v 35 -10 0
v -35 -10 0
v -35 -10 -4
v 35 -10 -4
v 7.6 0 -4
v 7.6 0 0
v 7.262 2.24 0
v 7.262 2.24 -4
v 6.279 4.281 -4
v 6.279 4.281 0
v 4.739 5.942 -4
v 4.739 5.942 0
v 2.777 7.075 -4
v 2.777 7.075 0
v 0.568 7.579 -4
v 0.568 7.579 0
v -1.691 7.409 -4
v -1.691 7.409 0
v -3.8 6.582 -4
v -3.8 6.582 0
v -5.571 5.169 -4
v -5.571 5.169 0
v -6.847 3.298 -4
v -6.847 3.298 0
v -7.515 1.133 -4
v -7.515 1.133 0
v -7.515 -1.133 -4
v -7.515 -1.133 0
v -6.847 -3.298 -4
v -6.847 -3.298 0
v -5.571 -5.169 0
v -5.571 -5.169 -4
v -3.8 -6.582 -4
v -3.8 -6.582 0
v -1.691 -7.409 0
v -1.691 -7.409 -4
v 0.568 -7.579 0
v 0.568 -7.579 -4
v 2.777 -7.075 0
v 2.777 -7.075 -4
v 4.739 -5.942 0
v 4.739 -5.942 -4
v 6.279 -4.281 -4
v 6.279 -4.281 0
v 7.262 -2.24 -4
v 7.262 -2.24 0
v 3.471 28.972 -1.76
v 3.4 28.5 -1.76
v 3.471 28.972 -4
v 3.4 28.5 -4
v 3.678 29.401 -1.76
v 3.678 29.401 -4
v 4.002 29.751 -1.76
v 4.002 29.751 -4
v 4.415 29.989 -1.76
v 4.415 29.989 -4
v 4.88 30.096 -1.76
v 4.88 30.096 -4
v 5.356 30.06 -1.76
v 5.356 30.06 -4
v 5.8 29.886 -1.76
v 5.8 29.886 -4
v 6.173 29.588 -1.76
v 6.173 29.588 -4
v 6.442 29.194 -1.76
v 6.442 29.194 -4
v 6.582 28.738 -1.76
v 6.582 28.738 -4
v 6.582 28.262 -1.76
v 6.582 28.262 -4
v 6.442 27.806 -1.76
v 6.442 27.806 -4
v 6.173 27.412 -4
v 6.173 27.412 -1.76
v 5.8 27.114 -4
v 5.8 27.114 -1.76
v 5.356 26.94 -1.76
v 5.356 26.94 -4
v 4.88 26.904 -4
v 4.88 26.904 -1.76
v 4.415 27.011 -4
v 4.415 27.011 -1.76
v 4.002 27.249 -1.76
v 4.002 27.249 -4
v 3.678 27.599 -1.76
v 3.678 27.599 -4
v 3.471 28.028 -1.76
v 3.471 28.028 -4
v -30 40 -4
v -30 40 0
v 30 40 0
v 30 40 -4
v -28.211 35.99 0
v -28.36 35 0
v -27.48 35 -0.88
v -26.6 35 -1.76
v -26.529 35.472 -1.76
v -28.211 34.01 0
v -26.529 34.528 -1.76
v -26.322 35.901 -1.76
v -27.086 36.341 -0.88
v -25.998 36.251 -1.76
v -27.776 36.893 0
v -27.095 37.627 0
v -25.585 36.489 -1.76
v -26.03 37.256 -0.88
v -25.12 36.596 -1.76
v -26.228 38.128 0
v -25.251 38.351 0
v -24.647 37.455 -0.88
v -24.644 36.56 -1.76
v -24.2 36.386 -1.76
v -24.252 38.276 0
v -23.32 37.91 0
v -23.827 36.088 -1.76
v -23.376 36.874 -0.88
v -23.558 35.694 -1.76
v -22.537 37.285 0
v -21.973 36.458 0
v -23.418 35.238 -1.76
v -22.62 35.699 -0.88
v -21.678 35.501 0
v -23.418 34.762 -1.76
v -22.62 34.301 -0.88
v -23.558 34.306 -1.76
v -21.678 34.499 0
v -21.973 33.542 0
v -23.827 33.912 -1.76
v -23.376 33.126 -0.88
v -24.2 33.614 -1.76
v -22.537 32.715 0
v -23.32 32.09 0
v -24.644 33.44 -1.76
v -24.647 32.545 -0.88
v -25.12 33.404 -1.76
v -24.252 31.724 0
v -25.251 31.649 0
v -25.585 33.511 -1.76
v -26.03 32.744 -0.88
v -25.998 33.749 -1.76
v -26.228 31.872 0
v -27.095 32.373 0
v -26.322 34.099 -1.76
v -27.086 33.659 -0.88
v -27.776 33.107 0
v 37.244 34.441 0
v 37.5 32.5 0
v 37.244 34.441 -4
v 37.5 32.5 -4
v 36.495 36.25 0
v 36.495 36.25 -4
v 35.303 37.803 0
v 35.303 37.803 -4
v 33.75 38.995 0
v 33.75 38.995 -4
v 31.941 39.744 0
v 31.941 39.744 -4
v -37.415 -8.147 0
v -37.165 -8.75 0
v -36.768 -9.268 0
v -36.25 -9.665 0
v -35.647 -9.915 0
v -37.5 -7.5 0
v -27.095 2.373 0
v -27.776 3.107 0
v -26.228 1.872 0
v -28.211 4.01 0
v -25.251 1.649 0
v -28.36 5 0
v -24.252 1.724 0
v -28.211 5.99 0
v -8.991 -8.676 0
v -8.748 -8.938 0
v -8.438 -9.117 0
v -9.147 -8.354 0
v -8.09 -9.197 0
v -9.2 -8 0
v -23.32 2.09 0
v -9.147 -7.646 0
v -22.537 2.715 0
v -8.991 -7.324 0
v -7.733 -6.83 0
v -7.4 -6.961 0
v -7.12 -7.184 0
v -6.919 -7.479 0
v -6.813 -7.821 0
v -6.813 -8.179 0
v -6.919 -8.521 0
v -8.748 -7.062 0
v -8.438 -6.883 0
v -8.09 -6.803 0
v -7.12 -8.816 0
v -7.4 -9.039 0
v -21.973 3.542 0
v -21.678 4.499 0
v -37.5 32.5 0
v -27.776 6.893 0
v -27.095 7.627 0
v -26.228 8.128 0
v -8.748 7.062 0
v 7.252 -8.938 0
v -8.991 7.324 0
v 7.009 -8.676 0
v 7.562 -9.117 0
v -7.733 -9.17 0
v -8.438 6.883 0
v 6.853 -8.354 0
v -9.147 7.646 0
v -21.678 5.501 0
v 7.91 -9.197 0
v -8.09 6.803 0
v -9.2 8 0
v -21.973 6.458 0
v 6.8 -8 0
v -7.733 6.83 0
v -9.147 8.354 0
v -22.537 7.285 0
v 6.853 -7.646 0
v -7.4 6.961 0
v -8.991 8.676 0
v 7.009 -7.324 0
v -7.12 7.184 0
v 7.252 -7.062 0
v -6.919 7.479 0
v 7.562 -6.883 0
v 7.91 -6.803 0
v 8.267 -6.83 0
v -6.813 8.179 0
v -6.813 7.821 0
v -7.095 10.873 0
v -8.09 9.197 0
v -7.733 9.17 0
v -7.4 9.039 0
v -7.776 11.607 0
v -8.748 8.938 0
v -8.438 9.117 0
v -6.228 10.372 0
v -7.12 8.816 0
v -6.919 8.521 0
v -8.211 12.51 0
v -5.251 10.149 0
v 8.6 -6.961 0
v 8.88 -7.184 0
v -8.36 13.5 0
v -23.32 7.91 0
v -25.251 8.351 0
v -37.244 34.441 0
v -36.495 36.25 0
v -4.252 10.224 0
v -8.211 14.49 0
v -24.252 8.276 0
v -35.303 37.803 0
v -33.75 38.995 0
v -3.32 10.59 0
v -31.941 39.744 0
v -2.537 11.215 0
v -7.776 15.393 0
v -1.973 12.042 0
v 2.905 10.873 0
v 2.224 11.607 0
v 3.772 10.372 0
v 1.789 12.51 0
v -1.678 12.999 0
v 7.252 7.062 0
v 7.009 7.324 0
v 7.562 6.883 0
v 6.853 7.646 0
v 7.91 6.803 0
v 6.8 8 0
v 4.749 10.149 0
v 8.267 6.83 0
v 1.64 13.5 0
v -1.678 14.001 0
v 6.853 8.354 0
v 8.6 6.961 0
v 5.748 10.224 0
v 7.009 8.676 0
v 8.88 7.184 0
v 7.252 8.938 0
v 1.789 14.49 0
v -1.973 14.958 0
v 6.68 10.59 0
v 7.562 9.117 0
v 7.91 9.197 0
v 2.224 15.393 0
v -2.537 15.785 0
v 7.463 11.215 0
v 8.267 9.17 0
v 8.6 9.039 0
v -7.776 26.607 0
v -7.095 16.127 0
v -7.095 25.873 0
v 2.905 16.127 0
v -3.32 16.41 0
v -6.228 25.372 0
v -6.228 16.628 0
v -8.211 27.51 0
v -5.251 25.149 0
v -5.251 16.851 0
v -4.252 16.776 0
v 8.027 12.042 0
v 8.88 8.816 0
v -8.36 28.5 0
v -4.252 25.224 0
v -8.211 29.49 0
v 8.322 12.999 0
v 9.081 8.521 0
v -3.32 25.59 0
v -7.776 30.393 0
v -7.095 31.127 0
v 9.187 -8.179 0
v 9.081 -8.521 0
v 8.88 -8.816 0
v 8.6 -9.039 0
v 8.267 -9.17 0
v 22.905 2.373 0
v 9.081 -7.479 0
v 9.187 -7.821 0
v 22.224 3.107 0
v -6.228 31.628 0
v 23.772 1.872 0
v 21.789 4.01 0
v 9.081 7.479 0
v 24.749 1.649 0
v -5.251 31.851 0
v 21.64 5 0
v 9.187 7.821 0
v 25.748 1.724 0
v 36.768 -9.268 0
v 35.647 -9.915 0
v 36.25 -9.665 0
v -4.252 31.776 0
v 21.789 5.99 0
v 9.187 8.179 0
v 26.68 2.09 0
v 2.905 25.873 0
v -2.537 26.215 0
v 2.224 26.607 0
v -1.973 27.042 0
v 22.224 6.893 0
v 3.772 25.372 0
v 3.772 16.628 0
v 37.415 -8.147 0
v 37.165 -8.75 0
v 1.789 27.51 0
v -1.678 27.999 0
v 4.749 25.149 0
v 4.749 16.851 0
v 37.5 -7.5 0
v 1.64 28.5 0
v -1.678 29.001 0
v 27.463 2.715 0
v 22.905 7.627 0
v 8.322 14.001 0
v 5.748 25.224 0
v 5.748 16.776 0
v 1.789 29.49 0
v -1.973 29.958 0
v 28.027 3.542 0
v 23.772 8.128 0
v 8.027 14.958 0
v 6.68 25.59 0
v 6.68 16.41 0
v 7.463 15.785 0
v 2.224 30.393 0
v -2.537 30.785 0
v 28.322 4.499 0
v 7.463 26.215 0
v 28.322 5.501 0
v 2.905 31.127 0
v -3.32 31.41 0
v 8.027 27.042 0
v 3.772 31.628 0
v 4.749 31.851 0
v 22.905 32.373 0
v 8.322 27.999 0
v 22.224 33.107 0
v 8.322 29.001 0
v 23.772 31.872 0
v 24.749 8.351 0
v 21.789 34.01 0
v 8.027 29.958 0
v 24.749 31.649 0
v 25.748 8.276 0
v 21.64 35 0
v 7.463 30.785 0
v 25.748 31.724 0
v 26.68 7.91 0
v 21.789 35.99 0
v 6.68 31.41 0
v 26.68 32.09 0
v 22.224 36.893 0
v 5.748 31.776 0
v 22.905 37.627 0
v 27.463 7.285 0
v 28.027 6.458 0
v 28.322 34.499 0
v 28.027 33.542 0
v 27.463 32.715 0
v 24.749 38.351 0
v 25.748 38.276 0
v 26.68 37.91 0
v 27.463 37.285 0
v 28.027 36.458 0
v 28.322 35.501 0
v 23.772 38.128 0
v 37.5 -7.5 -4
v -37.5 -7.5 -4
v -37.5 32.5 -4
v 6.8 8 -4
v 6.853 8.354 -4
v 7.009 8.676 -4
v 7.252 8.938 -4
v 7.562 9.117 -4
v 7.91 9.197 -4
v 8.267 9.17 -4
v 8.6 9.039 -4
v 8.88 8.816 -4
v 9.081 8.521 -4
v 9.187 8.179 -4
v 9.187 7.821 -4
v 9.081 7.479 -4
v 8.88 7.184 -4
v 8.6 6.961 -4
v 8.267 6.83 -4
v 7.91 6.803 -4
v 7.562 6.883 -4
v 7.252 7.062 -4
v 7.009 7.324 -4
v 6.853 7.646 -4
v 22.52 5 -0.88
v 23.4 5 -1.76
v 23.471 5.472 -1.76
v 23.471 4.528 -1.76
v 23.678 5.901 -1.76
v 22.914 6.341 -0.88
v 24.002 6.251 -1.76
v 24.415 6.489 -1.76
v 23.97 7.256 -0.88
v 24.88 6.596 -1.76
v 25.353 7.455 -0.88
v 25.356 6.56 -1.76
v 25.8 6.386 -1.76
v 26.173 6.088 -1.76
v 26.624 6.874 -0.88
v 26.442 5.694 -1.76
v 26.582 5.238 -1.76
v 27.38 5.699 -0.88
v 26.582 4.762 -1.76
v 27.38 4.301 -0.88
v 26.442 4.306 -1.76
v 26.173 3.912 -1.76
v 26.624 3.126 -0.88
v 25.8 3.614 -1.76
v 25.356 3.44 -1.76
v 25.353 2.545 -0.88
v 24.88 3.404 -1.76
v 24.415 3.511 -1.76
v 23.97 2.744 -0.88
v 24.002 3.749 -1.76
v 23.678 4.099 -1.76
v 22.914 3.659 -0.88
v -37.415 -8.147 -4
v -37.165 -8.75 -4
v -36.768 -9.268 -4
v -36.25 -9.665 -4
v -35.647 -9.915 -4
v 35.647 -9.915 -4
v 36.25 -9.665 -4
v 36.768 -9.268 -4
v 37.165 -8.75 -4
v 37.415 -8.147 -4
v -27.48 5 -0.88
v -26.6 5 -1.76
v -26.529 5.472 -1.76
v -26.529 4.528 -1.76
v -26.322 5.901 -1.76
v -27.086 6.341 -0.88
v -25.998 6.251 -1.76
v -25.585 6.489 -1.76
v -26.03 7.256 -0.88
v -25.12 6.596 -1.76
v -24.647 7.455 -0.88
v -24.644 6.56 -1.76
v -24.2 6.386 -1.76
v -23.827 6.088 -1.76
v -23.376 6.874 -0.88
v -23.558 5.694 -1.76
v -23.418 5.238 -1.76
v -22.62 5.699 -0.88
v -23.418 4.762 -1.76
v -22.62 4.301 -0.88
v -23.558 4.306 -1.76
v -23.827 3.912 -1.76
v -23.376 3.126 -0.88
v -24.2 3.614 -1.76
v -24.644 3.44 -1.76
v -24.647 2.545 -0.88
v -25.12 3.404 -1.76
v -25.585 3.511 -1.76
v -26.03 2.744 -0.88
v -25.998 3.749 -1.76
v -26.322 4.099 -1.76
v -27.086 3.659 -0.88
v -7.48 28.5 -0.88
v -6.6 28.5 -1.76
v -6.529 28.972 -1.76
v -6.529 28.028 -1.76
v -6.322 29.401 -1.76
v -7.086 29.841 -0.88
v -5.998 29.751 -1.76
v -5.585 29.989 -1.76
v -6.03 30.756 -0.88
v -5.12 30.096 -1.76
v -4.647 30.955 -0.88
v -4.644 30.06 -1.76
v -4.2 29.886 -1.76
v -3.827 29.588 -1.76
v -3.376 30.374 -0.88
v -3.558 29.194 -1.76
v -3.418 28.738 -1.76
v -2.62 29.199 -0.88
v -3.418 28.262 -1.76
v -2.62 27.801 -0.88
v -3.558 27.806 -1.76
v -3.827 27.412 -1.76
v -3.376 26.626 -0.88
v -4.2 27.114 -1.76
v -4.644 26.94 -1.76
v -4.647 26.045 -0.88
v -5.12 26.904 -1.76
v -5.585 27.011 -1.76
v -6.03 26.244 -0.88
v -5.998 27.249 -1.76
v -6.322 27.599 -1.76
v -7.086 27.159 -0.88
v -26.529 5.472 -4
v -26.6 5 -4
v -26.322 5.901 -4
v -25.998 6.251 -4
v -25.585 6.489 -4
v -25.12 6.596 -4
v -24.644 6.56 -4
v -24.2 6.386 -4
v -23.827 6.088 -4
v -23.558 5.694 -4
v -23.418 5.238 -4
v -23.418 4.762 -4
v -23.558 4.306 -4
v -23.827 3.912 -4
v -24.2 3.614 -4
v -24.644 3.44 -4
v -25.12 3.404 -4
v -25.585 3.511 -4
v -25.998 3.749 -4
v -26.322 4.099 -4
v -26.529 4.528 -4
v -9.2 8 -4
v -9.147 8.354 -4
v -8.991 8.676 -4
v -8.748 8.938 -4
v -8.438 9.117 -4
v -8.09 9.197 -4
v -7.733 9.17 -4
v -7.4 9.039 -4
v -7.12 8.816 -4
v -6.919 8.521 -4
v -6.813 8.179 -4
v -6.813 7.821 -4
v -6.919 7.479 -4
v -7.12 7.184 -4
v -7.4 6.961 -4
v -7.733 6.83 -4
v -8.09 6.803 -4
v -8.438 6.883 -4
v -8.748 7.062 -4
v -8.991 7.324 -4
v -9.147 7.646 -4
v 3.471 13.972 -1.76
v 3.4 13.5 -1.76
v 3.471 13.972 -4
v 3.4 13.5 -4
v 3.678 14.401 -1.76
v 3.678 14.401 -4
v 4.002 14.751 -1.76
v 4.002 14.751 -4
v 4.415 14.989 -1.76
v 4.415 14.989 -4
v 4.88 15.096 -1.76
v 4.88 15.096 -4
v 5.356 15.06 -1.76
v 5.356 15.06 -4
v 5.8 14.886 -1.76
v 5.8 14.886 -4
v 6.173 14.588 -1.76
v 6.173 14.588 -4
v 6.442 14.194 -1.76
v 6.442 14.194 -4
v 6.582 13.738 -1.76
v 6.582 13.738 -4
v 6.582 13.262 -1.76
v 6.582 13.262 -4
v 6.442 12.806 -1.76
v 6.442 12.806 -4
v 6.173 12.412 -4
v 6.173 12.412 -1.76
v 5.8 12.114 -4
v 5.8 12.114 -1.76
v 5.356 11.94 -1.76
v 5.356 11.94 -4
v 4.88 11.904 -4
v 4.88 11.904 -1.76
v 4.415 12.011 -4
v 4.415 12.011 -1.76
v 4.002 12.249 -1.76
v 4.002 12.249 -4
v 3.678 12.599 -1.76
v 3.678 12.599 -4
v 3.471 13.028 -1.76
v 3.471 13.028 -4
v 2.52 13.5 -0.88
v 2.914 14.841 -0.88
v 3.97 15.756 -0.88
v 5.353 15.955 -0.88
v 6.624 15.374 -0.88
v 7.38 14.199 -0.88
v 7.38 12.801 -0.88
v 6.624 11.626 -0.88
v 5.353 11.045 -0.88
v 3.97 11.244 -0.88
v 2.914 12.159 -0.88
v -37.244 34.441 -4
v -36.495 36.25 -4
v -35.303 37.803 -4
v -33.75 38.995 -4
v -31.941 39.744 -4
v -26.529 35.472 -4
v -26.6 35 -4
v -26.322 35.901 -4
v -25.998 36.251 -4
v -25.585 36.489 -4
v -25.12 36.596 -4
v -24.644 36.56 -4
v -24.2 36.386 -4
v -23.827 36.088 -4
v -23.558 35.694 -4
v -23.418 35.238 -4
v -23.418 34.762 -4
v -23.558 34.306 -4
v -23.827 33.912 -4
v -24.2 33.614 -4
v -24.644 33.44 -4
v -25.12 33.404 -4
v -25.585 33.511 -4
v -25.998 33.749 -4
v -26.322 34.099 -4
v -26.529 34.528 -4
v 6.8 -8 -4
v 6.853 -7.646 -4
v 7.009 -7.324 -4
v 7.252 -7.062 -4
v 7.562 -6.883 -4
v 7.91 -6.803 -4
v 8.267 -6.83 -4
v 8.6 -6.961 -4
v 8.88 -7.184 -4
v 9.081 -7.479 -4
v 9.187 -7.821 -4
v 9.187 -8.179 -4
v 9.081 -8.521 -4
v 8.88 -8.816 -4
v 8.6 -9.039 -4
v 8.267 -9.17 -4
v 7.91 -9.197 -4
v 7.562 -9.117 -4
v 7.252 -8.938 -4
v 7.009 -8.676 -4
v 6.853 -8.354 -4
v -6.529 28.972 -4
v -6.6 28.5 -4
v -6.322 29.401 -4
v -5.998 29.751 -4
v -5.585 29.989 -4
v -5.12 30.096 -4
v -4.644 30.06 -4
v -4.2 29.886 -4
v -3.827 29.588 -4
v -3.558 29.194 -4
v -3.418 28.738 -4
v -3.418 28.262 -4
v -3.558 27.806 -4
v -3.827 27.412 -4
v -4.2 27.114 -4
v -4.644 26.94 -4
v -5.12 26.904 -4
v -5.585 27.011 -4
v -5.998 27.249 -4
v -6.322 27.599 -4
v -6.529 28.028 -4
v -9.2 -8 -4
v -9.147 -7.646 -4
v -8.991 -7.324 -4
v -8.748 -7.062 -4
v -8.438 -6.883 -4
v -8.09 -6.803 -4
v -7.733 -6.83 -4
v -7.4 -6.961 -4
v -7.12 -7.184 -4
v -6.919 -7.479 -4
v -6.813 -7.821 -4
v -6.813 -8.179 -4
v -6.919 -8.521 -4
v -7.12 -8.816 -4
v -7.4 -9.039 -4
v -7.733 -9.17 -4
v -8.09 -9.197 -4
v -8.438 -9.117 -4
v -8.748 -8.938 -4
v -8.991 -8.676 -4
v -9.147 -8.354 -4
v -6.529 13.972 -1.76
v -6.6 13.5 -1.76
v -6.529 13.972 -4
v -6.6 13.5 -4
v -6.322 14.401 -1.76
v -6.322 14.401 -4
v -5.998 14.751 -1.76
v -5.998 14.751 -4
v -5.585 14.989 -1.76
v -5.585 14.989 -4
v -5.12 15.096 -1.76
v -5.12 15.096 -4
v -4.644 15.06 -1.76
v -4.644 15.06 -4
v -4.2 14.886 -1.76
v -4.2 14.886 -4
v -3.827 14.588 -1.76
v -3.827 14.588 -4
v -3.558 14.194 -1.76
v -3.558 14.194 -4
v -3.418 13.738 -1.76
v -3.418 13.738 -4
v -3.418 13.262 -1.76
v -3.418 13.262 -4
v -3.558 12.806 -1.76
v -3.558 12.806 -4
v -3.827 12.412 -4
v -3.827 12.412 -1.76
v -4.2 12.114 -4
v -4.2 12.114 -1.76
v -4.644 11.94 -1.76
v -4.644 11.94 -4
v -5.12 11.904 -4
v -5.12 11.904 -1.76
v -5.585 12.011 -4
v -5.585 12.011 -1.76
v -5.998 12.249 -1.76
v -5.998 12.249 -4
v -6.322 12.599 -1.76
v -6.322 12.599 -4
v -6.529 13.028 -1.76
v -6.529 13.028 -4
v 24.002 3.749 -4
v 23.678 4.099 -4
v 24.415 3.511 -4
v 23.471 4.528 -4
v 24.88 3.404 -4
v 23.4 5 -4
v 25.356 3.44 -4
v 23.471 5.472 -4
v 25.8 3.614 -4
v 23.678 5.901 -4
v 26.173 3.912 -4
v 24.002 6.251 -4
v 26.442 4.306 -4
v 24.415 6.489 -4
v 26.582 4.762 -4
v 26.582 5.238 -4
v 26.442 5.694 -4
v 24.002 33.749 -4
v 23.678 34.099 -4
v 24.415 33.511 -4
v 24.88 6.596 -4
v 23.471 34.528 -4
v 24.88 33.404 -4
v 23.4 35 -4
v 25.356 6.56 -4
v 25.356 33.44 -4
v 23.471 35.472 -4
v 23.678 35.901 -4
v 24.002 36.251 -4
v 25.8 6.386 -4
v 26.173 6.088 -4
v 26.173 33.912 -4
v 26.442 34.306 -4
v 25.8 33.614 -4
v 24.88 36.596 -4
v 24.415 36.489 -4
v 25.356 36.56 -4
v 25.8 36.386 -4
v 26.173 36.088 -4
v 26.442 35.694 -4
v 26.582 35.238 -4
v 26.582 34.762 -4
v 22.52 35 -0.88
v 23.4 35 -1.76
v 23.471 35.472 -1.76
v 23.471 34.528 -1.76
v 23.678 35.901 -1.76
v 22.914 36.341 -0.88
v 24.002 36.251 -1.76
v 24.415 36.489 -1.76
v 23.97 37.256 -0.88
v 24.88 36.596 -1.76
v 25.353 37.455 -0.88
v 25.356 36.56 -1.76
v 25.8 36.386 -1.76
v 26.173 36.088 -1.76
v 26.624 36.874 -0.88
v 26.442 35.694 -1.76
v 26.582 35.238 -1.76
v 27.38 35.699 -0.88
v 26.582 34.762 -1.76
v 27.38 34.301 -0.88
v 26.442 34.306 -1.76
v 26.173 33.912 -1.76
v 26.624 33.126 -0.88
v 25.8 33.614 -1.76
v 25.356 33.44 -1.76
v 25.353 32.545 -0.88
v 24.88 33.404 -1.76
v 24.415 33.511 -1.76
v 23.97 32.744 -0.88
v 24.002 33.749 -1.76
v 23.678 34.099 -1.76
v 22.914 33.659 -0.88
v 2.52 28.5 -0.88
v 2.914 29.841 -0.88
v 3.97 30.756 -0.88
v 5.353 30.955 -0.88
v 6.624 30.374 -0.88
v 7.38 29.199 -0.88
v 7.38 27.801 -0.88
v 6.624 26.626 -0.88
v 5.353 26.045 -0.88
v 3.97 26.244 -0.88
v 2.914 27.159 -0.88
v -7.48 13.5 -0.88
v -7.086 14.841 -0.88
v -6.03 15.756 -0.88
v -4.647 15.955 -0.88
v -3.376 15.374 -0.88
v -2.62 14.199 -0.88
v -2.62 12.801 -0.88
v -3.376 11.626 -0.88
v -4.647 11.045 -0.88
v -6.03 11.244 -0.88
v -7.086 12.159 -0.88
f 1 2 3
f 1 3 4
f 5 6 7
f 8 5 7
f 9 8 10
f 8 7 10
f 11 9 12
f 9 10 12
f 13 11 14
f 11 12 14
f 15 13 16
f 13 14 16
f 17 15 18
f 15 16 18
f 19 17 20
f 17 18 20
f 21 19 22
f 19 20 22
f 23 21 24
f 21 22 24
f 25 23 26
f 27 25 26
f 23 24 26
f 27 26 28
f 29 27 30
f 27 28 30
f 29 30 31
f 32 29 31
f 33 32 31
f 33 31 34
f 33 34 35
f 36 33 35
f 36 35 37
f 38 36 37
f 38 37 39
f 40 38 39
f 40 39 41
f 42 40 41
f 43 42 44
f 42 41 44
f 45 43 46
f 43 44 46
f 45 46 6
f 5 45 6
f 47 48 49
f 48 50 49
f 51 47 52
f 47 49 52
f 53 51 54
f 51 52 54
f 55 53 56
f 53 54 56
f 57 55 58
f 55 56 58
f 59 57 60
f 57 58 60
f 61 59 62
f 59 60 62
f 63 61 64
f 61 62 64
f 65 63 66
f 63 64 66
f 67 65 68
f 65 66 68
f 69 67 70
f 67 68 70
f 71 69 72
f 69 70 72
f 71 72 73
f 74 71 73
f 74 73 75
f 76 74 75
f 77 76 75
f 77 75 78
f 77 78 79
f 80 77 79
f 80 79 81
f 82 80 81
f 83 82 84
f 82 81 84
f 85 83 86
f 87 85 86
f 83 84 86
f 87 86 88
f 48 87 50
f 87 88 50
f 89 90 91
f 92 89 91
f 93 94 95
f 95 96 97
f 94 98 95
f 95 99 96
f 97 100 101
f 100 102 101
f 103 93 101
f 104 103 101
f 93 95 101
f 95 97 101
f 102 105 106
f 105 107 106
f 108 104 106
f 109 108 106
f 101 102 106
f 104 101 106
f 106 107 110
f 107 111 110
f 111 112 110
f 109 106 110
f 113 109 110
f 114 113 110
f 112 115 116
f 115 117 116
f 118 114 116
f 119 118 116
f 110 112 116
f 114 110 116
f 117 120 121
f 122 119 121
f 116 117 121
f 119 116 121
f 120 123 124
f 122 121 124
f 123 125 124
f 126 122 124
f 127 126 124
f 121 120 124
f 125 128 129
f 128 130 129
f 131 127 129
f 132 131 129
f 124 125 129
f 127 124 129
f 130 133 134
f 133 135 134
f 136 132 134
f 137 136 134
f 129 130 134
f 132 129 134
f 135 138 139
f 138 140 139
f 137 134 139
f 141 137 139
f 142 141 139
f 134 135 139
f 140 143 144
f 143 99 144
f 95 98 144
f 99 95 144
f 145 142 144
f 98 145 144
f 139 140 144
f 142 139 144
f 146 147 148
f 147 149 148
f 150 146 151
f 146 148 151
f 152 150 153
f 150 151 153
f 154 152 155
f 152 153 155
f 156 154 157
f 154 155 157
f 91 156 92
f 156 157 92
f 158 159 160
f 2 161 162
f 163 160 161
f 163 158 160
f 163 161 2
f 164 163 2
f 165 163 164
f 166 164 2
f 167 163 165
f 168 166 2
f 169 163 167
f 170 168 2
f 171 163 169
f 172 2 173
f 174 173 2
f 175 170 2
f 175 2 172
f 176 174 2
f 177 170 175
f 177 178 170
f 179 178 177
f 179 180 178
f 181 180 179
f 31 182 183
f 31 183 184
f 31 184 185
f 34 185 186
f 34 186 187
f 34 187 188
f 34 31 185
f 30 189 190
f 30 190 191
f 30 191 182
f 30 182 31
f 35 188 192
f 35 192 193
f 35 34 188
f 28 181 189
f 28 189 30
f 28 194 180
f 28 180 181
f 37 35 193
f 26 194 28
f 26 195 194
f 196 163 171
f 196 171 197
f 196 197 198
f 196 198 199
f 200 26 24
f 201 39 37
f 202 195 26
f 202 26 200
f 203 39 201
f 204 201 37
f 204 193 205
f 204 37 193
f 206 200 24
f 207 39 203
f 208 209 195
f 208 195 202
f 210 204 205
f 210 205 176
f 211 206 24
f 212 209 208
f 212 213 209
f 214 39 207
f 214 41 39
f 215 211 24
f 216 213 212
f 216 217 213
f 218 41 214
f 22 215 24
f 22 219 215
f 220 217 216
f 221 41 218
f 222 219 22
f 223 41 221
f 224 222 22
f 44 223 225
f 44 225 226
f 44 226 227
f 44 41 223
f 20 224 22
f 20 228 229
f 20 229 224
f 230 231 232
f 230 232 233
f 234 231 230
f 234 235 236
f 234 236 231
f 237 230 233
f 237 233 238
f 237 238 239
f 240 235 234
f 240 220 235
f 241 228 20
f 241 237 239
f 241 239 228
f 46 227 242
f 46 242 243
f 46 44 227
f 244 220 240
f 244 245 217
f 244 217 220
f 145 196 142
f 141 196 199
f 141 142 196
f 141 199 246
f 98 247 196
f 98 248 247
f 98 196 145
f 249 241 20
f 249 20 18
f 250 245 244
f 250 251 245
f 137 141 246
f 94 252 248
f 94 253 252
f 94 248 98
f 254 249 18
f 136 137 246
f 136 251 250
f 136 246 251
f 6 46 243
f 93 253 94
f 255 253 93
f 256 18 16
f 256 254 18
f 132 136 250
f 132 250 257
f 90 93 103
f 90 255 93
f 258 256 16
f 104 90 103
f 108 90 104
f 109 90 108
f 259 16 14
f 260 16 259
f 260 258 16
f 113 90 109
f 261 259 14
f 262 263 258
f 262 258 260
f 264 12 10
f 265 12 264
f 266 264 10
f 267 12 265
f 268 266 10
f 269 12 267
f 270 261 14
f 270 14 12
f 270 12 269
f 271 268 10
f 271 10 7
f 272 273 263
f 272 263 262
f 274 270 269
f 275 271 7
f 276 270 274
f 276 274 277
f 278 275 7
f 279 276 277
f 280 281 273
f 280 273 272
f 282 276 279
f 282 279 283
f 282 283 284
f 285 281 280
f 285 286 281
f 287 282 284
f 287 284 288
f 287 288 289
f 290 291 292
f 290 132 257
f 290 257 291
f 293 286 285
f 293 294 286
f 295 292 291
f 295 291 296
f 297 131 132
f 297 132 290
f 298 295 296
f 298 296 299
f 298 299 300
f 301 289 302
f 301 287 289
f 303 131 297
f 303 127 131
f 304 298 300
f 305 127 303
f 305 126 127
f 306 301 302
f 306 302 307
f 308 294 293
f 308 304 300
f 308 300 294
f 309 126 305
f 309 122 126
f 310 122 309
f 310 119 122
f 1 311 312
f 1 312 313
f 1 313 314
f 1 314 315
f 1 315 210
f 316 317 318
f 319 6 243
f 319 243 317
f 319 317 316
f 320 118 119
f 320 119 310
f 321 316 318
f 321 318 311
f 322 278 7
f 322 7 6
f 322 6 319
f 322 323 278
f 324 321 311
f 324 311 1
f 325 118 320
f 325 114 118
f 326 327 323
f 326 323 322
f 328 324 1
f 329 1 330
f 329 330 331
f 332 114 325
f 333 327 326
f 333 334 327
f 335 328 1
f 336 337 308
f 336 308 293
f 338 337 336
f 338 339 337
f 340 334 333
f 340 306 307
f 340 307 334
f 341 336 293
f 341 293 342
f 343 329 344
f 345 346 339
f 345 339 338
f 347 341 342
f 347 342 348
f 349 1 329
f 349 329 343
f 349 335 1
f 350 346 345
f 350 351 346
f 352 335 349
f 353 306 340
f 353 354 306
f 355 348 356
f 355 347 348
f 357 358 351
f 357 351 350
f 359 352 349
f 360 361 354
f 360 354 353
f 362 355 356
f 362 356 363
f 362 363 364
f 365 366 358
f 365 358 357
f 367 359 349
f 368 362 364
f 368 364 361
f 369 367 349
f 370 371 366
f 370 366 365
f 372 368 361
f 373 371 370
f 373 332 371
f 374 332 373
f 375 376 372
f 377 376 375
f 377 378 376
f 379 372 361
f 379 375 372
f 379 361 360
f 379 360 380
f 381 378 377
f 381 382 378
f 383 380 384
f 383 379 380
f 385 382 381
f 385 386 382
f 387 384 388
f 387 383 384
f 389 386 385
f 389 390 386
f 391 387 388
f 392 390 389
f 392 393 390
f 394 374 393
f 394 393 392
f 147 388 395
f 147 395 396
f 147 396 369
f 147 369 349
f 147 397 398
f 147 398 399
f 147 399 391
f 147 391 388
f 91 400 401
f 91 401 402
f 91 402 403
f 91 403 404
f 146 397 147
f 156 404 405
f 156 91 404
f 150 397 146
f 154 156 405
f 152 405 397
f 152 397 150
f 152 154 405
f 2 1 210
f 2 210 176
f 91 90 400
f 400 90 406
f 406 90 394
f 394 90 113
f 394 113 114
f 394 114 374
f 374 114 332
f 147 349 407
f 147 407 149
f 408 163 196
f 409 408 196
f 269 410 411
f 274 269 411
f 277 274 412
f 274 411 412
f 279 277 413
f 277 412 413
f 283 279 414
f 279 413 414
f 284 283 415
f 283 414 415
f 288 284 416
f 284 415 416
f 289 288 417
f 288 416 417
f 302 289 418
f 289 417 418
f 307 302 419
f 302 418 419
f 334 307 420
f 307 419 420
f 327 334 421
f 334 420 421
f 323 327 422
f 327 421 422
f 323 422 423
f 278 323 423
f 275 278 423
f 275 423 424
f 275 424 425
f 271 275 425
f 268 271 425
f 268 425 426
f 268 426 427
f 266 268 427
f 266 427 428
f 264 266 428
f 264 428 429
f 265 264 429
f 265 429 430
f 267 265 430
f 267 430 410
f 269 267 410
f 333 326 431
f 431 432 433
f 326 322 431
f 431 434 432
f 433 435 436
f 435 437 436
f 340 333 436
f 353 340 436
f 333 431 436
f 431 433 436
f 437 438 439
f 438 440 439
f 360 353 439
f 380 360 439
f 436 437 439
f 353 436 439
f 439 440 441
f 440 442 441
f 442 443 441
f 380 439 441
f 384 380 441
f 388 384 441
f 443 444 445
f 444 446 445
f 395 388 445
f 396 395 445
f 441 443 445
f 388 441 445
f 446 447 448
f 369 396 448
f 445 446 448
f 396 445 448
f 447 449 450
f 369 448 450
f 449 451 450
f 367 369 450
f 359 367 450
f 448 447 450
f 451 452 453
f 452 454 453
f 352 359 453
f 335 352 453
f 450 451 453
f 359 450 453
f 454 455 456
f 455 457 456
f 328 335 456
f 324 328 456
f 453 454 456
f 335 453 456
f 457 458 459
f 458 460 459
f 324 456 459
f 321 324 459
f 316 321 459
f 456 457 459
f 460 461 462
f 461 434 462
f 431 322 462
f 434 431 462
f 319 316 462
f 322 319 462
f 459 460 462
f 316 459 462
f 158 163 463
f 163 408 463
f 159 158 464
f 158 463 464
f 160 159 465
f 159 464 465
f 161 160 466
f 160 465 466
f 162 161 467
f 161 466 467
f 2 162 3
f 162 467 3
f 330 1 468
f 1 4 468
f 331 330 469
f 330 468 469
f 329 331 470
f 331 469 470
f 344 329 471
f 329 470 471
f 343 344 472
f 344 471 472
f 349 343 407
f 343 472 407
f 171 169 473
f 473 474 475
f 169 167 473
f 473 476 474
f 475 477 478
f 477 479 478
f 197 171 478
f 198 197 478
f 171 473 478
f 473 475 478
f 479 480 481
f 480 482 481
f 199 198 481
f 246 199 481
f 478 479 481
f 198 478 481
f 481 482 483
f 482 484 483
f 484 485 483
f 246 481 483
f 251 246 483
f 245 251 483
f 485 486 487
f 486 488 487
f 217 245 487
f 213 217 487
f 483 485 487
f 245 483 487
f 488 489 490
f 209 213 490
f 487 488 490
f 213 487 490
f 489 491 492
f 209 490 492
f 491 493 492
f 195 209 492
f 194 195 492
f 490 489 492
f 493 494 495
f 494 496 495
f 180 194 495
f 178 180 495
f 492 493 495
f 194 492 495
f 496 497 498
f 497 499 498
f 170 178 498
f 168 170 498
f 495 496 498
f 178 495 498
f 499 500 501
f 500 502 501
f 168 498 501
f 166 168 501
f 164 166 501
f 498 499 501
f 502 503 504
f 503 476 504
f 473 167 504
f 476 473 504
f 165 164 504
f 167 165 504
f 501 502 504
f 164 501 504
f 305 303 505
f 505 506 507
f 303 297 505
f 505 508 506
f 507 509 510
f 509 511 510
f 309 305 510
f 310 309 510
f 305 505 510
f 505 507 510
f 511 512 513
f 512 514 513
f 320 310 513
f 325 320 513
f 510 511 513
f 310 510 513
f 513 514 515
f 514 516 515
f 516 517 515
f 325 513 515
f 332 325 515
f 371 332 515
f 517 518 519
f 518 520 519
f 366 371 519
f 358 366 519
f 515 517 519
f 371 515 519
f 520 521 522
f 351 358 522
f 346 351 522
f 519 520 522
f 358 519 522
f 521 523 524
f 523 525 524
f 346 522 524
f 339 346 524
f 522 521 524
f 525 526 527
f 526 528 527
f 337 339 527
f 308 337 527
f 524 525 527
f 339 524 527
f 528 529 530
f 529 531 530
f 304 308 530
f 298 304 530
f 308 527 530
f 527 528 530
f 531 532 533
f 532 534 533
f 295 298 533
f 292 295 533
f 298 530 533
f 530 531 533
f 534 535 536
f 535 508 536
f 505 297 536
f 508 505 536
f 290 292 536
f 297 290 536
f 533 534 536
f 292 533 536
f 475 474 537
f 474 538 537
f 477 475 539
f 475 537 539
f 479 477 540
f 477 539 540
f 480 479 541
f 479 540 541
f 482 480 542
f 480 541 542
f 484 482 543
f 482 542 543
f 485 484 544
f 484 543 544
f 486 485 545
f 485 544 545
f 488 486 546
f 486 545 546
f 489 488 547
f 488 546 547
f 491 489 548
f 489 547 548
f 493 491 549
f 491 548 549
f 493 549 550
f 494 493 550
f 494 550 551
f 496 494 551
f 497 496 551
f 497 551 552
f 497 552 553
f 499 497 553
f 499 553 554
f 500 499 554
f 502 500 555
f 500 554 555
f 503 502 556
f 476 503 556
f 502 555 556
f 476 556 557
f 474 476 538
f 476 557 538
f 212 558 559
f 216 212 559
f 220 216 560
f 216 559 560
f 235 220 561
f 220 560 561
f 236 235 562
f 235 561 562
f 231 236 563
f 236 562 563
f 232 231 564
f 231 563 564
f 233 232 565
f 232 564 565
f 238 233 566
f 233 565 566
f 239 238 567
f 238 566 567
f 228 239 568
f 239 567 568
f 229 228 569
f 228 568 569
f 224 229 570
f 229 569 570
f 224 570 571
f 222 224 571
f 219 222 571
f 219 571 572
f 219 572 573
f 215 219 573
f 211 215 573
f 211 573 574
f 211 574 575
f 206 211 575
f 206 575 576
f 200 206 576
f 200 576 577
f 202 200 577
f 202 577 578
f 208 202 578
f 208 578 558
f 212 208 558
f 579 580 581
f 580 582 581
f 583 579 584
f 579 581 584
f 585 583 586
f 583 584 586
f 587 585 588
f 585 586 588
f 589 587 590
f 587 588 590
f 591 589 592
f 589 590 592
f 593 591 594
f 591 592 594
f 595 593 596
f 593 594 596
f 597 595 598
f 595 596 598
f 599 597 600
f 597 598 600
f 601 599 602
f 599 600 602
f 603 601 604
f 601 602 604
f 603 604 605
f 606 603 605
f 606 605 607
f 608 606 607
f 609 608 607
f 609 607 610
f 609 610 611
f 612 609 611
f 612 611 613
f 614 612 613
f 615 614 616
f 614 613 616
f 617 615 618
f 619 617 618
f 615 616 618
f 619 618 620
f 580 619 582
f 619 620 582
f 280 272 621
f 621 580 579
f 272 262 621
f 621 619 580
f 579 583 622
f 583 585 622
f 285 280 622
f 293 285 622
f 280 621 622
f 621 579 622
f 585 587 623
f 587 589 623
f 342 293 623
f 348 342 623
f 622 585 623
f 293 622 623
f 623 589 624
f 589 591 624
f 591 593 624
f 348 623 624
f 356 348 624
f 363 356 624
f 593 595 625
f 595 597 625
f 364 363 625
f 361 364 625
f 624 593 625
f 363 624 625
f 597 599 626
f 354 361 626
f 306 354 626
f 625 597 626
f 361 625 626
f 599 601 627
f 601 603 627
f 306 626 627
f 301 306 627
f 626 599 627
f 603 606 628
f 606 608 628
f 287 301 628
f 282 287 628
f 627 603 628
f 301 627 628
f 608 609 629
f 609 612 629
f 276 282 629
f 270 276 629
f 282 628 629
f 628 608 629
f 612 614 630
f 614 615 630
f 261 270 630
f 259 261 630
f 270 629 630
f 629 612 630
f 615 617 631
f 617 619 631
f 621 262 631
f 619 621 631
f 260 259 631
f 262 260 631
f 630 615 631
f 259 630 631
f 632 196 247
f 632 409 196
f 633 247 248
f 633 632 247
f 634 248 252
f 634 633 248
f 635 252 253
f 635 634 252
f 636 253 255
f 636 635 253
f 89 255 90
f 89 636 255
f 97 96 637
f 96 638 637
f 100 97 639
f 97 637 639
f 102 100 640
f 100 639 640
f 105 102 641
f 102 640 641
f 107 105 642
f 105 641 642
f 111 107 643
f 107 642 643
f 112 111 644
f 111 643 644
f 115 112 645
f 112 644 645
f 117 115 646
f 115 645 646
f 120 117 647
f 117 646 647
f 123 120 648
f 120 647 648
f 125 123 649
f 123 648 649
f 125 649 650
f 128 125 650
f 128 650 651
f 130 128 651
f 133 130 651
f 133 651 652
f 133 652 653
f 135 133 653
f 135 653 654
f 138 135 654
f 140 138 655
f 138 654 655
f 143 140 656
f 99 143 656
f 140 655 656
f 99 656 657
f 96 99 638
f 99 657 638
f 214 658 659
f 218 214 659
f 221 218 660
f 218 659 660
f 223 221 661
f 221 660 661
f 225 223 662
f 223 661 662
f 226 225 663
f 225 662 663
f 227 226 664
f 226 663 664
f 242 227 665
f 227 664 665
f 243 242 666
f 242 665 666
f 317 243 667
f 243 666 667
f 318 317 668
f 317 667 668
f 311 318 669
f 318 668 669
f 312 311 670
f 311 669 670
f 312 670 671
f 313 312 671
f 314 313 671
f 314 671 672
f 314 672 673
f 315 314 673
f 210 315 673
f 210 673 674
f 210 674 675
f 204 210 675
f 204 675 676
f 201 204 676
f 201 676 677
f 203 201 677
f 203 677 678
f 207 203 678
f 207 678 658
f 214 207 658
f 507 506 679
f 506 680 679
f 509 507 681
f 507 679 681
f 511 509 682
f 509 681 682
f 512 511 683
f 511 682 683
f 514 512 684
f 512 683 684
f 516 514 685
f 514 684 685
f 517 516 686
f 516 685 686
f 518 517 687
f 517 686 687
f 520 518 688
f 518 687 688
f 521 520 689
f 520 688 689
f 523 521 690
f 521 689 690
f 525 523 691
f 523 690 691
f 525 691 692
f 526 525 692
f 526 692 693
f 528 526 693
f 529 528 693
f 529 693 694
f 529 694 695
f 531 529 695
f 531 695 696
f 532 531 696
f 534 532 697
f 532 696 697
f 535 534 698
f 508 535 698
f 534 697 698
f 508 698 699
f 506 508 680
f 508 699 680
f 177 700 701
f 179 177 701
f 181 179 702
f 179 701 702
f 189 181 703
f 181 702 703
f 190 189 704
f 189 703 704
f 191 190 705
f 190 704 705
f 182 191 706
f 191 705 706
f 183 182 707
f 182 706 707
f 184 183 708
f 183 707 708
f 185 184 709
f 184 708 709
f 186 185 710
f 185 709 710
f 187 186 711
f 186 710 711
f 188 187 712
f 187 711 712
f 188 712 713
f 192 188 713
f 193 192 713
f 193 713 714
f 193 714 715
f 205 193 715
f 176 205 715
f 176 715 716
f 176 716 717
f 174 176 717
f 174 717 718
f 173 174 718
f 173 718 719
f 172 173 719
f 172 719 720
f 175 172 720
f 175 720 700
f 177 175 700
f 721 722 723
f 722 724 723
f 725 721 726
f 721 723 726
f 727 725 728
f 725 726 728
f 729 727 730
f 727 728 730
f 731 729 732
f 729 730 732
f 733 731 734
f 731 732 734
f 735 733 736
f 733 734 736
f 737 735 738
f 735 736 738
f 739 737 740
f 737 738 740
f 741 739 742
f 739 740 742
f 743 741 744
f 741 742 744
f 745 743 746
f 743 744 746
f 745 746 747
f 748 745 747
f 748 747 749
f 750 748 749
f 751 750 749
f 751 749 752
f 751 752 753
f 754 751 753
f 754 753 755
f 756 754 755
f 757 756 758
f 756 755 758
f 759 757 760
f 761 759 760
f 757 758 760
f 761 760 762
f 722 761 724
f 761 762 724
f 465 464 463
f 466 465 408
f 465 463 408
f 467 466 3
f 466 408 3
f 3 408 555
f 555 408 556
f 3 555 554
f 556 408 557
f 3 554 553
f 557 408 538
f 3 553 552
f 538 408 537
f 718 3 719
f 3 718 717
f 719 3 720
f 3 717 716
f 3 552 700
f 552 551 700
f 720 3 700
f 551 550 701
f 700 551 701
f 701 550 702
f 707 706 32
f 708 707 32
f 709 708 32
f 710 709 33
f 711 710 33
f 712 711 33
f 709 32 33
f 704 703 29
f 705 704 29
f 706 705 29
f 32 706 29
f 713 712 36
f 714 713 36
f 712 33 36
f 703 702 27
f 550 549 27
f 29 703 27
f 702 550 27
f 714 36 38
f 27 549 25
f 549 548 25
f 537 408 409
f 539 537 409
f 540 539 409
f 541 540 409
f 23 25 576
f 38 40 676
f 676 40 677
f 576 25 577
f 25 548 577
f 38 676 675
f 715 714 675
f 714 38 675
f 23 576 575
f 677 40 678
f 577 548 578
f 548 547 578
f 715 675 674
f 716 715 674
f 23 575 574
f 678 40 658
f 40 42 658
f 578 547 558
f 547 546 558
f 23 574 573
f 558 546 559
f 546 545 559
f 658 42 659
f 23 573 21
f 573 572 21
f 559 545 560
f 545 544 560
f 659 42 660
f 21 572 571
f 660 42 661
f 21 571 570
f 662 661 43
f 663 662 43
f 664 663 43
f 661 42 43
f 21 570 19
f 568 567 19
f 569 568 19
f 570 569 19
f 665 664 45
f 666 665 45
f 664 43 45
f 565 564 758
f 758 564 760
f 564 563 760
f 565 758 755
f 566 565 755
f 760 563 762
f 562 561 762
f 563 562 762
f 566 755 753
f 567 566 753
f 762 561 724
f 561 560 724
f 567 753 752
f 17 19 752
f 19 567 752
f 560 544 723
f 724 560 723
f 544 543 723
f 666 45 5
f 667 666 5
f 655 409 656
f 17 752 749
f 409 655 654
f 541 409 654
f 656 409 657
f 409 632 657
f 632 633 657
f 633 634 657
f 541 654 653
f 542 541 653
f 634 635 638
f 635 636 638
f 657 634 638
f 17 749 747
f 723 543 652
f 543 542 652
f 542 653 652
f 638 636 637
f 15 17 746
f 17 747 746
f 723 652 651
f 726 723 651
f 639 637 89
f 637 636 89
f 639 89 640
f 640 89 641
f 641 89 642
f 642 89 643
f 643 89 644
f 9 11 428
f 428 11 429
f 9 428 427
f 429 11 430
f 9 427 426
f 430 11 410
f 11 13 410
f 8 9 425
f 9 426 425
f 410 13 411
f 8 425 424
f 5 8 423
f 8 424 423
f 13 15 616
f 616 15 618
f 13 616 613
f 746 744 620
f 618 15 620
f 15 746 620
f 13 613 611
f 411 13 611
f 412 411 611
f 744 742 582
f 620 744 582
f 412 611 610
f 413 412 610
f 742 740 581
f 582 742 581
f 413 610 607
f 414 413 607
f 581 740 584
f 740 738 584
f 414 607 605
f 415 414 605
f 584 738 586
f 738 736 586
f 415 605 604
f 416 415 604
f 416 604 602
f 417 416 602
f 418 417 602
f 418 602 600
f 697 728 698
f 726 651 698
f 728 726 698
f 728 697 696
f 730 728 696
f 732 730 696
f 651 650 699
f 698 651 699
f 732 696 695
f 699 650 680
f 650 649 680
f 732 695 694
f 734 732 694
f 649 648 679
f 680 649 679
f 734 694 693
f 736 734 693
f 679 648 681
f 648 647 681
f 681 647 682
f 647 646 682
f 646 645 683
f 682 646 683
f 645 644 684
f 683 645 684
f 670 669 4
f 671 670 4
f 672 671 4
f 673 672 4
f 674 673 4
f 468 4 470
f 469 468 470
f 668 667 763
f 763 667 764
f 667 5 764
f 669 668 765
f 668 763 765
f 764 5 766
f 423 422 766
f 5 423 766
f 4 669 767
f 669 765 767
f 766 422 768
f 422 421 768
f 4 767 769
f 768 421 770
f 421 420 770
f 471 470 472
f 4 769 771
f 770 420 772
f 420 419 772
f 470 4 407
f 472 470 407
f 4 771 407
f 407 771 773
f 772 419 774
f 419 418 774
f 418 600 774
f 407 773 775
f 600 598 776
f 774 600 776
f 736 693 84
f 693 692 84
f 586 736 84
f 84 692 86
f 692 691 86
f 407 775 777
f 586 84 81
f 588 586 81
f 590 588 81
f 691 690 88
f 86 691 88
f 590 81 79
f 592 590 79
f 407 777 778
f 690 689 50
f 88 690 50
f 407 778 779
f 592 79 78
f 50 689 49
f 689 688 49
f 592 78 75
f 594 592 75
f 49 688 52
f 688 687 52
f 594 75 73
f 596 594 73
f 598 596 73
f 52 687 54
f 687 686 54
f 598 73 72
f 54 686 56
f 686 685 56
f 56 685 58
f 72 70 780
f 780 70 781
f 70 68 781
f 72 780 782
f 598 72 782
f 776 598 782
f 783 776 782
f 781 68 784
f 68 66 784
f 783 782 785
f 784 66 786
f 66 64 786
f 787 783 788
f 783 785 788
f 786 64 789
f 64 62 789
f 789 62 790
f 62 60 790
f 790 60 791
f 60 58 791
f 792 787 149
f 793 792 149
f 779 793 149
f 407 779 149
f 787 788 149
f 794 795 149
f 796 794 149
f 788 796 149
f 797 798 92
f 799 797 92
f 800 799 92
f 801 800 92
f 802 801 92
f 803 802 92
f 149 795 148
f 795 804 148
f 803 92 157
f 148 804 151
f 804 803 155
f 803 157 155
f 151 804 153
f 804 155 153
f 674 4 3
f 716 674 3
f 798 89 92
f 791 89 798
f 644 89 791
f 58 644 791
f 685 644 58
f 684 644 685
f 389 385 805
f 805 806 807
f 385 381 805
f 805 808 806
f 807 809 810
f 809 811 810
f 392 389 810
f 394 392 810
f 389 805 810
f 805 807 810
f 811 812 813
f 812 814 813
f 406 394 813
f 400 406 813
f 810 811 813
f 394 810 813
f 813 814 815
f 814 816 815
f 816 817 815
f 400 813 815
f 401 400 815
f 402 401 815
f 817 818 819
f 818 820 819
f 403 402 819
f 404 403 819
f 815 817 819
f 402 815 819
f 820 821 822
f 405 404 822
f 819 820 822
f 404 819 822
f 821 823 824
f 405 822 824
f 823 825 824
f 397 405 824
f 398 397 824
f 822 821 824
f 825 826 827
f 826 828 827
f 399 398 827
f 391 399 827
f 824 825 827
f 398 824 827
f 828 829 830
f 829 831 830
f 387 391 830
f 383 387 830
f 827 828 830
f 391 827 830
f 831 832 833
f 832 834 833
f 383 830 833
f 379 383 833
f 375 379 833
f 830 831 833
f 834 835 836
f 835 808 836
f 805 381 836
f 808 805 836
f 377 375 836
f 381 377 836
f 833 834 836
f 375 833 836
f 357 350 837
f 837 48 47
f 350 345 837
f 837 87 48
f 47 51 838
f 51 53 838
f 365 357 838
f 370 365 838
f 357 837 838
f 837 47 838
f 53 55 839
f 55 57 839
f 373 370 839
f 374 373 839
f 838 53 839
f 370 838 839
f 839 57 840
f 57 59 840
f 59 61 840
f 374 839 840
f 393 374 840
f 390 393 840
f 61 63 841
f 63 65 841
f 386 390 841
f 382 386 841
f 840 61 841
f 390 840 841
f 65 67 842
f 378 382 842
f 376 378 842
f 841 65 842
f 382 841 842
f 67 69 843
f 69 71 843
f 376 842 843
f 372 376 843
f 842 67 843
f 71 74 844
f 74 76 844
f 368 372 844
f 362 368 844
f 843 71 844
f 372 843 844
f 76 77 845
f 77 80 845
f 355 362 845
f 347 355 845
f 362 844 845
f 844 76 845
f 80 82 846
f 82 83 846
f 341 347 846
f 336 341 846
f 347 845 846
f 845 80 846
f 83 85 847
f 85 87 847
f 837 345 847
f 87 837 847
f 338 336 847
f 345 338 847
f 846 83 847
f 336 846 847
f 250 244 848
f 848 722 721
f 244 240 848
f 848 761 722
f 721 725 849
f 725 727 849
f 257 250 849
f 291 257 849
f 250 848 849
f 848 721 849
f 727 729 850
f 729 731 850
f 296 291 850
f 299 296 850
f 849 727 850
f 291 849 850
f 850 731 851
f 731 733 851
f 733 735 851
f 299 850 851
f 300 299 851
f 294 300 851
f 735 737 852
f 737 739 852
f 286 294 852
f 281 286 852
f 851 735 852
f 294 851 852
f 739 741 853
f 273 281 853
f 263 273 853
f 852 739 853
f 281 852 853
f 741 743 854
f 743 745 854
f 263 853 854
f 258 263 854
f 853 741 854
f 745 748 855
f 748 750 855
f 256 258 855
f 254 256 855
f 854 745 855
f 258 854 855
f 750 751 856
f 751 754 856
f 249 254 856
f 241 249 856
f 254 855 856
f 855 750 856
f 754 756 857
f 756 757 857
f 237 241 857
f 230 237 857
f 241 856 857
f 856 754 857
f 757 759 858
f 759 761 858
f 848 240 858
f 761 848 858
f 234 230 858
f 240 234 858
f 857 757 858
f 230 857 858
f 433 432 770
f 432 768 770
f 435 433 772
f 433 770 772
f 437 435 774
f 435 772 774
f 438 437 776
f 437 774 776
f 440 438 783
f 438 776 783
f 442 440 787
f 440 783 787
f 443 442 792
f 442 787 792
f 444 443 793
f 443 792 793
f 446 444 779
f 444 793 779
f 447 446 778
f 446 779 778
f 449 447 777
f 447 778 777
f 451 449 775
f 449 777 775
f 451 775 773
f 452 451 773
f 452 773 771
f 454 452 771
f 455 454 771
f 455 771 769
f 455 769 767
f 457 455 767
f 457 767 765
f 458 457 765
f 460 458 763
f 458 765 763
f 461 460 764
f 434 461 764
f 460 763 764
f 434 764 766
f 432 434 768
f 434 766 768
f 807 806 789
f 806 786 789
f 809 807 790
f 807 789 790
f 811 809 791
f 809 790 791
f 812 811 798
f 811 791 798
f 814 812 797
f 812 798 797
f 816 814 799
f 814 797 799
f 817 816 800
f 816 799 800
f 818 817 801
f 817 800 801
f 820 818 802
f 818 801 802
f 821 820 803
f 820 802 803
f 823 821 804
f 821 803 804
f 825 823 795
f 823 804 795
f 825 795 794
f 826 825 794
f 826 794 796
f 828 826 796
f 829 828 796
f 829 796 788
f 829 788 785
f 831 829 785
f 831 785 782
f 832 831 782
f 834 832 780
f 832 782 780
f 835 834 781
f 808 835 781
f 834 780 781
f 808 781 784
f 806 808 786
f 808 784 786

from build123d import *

# Parameters (mm, degrees)
F0_W           = 75
F0_H           = 50
F0_R           = 7.6
F1_DEPTH       = 4
F2_D           = 2.4
F3_D           = 3.2
F3_CSINK_D     = 6.72
F3_CSINK_ANGLE = 90
F4_R           = 7.5
F5_R           = 2.5


# Not quite as in the source:
# - a feature names something its author has since deleted; it is built from what else it names


with BuildPart() as f1:
    # F0 (on Top) → F1 (new body)
    with BuildSketch(Plane.XY):
        with Locations((0, 15)):
            Rectangle(F0_W, F0_H)
        Circle(F0_R, mode=Mode.SUBTRACT)
    extrude(amount=-F1_DEPTH)

    # F2 (through all)
    with Locations(Plane.XY):
        with Locations((-8, 8), (8, 8), (8, -8), (-8, -8)):
            Hole(F2_D / 2)

    # F3 (through all)
    with Locations(Plane.XY):
        with Locations((-25, 5), (25, 5), (-5, 28.5), (5, 28.5), (5, 13.5), (-5, 13.5), (-25, 35), (25, 35)):
            CounterSinkHole(F3_D / 2, F3_CSINK_D / 2, counter_sink_angle=F3_CSINK_ANGLE)

    # F4
    f4_edges = [f1.edges().sort_by_distance(p)[0] for p in [
        (-37.5, 40, -2),
        (37.5, 40, -2),
    ]]
    fillet(f4_edges, radius=F4_R)

    # F5
    f5_edges = [f1.edges().sort_by_distance(p)[0] for p in [
        (-37.5, -10, -2),
        (37.5, -10, -2),
    ]]
    fillet(f5_edges, radius=F5_R)


solid = f1.part
